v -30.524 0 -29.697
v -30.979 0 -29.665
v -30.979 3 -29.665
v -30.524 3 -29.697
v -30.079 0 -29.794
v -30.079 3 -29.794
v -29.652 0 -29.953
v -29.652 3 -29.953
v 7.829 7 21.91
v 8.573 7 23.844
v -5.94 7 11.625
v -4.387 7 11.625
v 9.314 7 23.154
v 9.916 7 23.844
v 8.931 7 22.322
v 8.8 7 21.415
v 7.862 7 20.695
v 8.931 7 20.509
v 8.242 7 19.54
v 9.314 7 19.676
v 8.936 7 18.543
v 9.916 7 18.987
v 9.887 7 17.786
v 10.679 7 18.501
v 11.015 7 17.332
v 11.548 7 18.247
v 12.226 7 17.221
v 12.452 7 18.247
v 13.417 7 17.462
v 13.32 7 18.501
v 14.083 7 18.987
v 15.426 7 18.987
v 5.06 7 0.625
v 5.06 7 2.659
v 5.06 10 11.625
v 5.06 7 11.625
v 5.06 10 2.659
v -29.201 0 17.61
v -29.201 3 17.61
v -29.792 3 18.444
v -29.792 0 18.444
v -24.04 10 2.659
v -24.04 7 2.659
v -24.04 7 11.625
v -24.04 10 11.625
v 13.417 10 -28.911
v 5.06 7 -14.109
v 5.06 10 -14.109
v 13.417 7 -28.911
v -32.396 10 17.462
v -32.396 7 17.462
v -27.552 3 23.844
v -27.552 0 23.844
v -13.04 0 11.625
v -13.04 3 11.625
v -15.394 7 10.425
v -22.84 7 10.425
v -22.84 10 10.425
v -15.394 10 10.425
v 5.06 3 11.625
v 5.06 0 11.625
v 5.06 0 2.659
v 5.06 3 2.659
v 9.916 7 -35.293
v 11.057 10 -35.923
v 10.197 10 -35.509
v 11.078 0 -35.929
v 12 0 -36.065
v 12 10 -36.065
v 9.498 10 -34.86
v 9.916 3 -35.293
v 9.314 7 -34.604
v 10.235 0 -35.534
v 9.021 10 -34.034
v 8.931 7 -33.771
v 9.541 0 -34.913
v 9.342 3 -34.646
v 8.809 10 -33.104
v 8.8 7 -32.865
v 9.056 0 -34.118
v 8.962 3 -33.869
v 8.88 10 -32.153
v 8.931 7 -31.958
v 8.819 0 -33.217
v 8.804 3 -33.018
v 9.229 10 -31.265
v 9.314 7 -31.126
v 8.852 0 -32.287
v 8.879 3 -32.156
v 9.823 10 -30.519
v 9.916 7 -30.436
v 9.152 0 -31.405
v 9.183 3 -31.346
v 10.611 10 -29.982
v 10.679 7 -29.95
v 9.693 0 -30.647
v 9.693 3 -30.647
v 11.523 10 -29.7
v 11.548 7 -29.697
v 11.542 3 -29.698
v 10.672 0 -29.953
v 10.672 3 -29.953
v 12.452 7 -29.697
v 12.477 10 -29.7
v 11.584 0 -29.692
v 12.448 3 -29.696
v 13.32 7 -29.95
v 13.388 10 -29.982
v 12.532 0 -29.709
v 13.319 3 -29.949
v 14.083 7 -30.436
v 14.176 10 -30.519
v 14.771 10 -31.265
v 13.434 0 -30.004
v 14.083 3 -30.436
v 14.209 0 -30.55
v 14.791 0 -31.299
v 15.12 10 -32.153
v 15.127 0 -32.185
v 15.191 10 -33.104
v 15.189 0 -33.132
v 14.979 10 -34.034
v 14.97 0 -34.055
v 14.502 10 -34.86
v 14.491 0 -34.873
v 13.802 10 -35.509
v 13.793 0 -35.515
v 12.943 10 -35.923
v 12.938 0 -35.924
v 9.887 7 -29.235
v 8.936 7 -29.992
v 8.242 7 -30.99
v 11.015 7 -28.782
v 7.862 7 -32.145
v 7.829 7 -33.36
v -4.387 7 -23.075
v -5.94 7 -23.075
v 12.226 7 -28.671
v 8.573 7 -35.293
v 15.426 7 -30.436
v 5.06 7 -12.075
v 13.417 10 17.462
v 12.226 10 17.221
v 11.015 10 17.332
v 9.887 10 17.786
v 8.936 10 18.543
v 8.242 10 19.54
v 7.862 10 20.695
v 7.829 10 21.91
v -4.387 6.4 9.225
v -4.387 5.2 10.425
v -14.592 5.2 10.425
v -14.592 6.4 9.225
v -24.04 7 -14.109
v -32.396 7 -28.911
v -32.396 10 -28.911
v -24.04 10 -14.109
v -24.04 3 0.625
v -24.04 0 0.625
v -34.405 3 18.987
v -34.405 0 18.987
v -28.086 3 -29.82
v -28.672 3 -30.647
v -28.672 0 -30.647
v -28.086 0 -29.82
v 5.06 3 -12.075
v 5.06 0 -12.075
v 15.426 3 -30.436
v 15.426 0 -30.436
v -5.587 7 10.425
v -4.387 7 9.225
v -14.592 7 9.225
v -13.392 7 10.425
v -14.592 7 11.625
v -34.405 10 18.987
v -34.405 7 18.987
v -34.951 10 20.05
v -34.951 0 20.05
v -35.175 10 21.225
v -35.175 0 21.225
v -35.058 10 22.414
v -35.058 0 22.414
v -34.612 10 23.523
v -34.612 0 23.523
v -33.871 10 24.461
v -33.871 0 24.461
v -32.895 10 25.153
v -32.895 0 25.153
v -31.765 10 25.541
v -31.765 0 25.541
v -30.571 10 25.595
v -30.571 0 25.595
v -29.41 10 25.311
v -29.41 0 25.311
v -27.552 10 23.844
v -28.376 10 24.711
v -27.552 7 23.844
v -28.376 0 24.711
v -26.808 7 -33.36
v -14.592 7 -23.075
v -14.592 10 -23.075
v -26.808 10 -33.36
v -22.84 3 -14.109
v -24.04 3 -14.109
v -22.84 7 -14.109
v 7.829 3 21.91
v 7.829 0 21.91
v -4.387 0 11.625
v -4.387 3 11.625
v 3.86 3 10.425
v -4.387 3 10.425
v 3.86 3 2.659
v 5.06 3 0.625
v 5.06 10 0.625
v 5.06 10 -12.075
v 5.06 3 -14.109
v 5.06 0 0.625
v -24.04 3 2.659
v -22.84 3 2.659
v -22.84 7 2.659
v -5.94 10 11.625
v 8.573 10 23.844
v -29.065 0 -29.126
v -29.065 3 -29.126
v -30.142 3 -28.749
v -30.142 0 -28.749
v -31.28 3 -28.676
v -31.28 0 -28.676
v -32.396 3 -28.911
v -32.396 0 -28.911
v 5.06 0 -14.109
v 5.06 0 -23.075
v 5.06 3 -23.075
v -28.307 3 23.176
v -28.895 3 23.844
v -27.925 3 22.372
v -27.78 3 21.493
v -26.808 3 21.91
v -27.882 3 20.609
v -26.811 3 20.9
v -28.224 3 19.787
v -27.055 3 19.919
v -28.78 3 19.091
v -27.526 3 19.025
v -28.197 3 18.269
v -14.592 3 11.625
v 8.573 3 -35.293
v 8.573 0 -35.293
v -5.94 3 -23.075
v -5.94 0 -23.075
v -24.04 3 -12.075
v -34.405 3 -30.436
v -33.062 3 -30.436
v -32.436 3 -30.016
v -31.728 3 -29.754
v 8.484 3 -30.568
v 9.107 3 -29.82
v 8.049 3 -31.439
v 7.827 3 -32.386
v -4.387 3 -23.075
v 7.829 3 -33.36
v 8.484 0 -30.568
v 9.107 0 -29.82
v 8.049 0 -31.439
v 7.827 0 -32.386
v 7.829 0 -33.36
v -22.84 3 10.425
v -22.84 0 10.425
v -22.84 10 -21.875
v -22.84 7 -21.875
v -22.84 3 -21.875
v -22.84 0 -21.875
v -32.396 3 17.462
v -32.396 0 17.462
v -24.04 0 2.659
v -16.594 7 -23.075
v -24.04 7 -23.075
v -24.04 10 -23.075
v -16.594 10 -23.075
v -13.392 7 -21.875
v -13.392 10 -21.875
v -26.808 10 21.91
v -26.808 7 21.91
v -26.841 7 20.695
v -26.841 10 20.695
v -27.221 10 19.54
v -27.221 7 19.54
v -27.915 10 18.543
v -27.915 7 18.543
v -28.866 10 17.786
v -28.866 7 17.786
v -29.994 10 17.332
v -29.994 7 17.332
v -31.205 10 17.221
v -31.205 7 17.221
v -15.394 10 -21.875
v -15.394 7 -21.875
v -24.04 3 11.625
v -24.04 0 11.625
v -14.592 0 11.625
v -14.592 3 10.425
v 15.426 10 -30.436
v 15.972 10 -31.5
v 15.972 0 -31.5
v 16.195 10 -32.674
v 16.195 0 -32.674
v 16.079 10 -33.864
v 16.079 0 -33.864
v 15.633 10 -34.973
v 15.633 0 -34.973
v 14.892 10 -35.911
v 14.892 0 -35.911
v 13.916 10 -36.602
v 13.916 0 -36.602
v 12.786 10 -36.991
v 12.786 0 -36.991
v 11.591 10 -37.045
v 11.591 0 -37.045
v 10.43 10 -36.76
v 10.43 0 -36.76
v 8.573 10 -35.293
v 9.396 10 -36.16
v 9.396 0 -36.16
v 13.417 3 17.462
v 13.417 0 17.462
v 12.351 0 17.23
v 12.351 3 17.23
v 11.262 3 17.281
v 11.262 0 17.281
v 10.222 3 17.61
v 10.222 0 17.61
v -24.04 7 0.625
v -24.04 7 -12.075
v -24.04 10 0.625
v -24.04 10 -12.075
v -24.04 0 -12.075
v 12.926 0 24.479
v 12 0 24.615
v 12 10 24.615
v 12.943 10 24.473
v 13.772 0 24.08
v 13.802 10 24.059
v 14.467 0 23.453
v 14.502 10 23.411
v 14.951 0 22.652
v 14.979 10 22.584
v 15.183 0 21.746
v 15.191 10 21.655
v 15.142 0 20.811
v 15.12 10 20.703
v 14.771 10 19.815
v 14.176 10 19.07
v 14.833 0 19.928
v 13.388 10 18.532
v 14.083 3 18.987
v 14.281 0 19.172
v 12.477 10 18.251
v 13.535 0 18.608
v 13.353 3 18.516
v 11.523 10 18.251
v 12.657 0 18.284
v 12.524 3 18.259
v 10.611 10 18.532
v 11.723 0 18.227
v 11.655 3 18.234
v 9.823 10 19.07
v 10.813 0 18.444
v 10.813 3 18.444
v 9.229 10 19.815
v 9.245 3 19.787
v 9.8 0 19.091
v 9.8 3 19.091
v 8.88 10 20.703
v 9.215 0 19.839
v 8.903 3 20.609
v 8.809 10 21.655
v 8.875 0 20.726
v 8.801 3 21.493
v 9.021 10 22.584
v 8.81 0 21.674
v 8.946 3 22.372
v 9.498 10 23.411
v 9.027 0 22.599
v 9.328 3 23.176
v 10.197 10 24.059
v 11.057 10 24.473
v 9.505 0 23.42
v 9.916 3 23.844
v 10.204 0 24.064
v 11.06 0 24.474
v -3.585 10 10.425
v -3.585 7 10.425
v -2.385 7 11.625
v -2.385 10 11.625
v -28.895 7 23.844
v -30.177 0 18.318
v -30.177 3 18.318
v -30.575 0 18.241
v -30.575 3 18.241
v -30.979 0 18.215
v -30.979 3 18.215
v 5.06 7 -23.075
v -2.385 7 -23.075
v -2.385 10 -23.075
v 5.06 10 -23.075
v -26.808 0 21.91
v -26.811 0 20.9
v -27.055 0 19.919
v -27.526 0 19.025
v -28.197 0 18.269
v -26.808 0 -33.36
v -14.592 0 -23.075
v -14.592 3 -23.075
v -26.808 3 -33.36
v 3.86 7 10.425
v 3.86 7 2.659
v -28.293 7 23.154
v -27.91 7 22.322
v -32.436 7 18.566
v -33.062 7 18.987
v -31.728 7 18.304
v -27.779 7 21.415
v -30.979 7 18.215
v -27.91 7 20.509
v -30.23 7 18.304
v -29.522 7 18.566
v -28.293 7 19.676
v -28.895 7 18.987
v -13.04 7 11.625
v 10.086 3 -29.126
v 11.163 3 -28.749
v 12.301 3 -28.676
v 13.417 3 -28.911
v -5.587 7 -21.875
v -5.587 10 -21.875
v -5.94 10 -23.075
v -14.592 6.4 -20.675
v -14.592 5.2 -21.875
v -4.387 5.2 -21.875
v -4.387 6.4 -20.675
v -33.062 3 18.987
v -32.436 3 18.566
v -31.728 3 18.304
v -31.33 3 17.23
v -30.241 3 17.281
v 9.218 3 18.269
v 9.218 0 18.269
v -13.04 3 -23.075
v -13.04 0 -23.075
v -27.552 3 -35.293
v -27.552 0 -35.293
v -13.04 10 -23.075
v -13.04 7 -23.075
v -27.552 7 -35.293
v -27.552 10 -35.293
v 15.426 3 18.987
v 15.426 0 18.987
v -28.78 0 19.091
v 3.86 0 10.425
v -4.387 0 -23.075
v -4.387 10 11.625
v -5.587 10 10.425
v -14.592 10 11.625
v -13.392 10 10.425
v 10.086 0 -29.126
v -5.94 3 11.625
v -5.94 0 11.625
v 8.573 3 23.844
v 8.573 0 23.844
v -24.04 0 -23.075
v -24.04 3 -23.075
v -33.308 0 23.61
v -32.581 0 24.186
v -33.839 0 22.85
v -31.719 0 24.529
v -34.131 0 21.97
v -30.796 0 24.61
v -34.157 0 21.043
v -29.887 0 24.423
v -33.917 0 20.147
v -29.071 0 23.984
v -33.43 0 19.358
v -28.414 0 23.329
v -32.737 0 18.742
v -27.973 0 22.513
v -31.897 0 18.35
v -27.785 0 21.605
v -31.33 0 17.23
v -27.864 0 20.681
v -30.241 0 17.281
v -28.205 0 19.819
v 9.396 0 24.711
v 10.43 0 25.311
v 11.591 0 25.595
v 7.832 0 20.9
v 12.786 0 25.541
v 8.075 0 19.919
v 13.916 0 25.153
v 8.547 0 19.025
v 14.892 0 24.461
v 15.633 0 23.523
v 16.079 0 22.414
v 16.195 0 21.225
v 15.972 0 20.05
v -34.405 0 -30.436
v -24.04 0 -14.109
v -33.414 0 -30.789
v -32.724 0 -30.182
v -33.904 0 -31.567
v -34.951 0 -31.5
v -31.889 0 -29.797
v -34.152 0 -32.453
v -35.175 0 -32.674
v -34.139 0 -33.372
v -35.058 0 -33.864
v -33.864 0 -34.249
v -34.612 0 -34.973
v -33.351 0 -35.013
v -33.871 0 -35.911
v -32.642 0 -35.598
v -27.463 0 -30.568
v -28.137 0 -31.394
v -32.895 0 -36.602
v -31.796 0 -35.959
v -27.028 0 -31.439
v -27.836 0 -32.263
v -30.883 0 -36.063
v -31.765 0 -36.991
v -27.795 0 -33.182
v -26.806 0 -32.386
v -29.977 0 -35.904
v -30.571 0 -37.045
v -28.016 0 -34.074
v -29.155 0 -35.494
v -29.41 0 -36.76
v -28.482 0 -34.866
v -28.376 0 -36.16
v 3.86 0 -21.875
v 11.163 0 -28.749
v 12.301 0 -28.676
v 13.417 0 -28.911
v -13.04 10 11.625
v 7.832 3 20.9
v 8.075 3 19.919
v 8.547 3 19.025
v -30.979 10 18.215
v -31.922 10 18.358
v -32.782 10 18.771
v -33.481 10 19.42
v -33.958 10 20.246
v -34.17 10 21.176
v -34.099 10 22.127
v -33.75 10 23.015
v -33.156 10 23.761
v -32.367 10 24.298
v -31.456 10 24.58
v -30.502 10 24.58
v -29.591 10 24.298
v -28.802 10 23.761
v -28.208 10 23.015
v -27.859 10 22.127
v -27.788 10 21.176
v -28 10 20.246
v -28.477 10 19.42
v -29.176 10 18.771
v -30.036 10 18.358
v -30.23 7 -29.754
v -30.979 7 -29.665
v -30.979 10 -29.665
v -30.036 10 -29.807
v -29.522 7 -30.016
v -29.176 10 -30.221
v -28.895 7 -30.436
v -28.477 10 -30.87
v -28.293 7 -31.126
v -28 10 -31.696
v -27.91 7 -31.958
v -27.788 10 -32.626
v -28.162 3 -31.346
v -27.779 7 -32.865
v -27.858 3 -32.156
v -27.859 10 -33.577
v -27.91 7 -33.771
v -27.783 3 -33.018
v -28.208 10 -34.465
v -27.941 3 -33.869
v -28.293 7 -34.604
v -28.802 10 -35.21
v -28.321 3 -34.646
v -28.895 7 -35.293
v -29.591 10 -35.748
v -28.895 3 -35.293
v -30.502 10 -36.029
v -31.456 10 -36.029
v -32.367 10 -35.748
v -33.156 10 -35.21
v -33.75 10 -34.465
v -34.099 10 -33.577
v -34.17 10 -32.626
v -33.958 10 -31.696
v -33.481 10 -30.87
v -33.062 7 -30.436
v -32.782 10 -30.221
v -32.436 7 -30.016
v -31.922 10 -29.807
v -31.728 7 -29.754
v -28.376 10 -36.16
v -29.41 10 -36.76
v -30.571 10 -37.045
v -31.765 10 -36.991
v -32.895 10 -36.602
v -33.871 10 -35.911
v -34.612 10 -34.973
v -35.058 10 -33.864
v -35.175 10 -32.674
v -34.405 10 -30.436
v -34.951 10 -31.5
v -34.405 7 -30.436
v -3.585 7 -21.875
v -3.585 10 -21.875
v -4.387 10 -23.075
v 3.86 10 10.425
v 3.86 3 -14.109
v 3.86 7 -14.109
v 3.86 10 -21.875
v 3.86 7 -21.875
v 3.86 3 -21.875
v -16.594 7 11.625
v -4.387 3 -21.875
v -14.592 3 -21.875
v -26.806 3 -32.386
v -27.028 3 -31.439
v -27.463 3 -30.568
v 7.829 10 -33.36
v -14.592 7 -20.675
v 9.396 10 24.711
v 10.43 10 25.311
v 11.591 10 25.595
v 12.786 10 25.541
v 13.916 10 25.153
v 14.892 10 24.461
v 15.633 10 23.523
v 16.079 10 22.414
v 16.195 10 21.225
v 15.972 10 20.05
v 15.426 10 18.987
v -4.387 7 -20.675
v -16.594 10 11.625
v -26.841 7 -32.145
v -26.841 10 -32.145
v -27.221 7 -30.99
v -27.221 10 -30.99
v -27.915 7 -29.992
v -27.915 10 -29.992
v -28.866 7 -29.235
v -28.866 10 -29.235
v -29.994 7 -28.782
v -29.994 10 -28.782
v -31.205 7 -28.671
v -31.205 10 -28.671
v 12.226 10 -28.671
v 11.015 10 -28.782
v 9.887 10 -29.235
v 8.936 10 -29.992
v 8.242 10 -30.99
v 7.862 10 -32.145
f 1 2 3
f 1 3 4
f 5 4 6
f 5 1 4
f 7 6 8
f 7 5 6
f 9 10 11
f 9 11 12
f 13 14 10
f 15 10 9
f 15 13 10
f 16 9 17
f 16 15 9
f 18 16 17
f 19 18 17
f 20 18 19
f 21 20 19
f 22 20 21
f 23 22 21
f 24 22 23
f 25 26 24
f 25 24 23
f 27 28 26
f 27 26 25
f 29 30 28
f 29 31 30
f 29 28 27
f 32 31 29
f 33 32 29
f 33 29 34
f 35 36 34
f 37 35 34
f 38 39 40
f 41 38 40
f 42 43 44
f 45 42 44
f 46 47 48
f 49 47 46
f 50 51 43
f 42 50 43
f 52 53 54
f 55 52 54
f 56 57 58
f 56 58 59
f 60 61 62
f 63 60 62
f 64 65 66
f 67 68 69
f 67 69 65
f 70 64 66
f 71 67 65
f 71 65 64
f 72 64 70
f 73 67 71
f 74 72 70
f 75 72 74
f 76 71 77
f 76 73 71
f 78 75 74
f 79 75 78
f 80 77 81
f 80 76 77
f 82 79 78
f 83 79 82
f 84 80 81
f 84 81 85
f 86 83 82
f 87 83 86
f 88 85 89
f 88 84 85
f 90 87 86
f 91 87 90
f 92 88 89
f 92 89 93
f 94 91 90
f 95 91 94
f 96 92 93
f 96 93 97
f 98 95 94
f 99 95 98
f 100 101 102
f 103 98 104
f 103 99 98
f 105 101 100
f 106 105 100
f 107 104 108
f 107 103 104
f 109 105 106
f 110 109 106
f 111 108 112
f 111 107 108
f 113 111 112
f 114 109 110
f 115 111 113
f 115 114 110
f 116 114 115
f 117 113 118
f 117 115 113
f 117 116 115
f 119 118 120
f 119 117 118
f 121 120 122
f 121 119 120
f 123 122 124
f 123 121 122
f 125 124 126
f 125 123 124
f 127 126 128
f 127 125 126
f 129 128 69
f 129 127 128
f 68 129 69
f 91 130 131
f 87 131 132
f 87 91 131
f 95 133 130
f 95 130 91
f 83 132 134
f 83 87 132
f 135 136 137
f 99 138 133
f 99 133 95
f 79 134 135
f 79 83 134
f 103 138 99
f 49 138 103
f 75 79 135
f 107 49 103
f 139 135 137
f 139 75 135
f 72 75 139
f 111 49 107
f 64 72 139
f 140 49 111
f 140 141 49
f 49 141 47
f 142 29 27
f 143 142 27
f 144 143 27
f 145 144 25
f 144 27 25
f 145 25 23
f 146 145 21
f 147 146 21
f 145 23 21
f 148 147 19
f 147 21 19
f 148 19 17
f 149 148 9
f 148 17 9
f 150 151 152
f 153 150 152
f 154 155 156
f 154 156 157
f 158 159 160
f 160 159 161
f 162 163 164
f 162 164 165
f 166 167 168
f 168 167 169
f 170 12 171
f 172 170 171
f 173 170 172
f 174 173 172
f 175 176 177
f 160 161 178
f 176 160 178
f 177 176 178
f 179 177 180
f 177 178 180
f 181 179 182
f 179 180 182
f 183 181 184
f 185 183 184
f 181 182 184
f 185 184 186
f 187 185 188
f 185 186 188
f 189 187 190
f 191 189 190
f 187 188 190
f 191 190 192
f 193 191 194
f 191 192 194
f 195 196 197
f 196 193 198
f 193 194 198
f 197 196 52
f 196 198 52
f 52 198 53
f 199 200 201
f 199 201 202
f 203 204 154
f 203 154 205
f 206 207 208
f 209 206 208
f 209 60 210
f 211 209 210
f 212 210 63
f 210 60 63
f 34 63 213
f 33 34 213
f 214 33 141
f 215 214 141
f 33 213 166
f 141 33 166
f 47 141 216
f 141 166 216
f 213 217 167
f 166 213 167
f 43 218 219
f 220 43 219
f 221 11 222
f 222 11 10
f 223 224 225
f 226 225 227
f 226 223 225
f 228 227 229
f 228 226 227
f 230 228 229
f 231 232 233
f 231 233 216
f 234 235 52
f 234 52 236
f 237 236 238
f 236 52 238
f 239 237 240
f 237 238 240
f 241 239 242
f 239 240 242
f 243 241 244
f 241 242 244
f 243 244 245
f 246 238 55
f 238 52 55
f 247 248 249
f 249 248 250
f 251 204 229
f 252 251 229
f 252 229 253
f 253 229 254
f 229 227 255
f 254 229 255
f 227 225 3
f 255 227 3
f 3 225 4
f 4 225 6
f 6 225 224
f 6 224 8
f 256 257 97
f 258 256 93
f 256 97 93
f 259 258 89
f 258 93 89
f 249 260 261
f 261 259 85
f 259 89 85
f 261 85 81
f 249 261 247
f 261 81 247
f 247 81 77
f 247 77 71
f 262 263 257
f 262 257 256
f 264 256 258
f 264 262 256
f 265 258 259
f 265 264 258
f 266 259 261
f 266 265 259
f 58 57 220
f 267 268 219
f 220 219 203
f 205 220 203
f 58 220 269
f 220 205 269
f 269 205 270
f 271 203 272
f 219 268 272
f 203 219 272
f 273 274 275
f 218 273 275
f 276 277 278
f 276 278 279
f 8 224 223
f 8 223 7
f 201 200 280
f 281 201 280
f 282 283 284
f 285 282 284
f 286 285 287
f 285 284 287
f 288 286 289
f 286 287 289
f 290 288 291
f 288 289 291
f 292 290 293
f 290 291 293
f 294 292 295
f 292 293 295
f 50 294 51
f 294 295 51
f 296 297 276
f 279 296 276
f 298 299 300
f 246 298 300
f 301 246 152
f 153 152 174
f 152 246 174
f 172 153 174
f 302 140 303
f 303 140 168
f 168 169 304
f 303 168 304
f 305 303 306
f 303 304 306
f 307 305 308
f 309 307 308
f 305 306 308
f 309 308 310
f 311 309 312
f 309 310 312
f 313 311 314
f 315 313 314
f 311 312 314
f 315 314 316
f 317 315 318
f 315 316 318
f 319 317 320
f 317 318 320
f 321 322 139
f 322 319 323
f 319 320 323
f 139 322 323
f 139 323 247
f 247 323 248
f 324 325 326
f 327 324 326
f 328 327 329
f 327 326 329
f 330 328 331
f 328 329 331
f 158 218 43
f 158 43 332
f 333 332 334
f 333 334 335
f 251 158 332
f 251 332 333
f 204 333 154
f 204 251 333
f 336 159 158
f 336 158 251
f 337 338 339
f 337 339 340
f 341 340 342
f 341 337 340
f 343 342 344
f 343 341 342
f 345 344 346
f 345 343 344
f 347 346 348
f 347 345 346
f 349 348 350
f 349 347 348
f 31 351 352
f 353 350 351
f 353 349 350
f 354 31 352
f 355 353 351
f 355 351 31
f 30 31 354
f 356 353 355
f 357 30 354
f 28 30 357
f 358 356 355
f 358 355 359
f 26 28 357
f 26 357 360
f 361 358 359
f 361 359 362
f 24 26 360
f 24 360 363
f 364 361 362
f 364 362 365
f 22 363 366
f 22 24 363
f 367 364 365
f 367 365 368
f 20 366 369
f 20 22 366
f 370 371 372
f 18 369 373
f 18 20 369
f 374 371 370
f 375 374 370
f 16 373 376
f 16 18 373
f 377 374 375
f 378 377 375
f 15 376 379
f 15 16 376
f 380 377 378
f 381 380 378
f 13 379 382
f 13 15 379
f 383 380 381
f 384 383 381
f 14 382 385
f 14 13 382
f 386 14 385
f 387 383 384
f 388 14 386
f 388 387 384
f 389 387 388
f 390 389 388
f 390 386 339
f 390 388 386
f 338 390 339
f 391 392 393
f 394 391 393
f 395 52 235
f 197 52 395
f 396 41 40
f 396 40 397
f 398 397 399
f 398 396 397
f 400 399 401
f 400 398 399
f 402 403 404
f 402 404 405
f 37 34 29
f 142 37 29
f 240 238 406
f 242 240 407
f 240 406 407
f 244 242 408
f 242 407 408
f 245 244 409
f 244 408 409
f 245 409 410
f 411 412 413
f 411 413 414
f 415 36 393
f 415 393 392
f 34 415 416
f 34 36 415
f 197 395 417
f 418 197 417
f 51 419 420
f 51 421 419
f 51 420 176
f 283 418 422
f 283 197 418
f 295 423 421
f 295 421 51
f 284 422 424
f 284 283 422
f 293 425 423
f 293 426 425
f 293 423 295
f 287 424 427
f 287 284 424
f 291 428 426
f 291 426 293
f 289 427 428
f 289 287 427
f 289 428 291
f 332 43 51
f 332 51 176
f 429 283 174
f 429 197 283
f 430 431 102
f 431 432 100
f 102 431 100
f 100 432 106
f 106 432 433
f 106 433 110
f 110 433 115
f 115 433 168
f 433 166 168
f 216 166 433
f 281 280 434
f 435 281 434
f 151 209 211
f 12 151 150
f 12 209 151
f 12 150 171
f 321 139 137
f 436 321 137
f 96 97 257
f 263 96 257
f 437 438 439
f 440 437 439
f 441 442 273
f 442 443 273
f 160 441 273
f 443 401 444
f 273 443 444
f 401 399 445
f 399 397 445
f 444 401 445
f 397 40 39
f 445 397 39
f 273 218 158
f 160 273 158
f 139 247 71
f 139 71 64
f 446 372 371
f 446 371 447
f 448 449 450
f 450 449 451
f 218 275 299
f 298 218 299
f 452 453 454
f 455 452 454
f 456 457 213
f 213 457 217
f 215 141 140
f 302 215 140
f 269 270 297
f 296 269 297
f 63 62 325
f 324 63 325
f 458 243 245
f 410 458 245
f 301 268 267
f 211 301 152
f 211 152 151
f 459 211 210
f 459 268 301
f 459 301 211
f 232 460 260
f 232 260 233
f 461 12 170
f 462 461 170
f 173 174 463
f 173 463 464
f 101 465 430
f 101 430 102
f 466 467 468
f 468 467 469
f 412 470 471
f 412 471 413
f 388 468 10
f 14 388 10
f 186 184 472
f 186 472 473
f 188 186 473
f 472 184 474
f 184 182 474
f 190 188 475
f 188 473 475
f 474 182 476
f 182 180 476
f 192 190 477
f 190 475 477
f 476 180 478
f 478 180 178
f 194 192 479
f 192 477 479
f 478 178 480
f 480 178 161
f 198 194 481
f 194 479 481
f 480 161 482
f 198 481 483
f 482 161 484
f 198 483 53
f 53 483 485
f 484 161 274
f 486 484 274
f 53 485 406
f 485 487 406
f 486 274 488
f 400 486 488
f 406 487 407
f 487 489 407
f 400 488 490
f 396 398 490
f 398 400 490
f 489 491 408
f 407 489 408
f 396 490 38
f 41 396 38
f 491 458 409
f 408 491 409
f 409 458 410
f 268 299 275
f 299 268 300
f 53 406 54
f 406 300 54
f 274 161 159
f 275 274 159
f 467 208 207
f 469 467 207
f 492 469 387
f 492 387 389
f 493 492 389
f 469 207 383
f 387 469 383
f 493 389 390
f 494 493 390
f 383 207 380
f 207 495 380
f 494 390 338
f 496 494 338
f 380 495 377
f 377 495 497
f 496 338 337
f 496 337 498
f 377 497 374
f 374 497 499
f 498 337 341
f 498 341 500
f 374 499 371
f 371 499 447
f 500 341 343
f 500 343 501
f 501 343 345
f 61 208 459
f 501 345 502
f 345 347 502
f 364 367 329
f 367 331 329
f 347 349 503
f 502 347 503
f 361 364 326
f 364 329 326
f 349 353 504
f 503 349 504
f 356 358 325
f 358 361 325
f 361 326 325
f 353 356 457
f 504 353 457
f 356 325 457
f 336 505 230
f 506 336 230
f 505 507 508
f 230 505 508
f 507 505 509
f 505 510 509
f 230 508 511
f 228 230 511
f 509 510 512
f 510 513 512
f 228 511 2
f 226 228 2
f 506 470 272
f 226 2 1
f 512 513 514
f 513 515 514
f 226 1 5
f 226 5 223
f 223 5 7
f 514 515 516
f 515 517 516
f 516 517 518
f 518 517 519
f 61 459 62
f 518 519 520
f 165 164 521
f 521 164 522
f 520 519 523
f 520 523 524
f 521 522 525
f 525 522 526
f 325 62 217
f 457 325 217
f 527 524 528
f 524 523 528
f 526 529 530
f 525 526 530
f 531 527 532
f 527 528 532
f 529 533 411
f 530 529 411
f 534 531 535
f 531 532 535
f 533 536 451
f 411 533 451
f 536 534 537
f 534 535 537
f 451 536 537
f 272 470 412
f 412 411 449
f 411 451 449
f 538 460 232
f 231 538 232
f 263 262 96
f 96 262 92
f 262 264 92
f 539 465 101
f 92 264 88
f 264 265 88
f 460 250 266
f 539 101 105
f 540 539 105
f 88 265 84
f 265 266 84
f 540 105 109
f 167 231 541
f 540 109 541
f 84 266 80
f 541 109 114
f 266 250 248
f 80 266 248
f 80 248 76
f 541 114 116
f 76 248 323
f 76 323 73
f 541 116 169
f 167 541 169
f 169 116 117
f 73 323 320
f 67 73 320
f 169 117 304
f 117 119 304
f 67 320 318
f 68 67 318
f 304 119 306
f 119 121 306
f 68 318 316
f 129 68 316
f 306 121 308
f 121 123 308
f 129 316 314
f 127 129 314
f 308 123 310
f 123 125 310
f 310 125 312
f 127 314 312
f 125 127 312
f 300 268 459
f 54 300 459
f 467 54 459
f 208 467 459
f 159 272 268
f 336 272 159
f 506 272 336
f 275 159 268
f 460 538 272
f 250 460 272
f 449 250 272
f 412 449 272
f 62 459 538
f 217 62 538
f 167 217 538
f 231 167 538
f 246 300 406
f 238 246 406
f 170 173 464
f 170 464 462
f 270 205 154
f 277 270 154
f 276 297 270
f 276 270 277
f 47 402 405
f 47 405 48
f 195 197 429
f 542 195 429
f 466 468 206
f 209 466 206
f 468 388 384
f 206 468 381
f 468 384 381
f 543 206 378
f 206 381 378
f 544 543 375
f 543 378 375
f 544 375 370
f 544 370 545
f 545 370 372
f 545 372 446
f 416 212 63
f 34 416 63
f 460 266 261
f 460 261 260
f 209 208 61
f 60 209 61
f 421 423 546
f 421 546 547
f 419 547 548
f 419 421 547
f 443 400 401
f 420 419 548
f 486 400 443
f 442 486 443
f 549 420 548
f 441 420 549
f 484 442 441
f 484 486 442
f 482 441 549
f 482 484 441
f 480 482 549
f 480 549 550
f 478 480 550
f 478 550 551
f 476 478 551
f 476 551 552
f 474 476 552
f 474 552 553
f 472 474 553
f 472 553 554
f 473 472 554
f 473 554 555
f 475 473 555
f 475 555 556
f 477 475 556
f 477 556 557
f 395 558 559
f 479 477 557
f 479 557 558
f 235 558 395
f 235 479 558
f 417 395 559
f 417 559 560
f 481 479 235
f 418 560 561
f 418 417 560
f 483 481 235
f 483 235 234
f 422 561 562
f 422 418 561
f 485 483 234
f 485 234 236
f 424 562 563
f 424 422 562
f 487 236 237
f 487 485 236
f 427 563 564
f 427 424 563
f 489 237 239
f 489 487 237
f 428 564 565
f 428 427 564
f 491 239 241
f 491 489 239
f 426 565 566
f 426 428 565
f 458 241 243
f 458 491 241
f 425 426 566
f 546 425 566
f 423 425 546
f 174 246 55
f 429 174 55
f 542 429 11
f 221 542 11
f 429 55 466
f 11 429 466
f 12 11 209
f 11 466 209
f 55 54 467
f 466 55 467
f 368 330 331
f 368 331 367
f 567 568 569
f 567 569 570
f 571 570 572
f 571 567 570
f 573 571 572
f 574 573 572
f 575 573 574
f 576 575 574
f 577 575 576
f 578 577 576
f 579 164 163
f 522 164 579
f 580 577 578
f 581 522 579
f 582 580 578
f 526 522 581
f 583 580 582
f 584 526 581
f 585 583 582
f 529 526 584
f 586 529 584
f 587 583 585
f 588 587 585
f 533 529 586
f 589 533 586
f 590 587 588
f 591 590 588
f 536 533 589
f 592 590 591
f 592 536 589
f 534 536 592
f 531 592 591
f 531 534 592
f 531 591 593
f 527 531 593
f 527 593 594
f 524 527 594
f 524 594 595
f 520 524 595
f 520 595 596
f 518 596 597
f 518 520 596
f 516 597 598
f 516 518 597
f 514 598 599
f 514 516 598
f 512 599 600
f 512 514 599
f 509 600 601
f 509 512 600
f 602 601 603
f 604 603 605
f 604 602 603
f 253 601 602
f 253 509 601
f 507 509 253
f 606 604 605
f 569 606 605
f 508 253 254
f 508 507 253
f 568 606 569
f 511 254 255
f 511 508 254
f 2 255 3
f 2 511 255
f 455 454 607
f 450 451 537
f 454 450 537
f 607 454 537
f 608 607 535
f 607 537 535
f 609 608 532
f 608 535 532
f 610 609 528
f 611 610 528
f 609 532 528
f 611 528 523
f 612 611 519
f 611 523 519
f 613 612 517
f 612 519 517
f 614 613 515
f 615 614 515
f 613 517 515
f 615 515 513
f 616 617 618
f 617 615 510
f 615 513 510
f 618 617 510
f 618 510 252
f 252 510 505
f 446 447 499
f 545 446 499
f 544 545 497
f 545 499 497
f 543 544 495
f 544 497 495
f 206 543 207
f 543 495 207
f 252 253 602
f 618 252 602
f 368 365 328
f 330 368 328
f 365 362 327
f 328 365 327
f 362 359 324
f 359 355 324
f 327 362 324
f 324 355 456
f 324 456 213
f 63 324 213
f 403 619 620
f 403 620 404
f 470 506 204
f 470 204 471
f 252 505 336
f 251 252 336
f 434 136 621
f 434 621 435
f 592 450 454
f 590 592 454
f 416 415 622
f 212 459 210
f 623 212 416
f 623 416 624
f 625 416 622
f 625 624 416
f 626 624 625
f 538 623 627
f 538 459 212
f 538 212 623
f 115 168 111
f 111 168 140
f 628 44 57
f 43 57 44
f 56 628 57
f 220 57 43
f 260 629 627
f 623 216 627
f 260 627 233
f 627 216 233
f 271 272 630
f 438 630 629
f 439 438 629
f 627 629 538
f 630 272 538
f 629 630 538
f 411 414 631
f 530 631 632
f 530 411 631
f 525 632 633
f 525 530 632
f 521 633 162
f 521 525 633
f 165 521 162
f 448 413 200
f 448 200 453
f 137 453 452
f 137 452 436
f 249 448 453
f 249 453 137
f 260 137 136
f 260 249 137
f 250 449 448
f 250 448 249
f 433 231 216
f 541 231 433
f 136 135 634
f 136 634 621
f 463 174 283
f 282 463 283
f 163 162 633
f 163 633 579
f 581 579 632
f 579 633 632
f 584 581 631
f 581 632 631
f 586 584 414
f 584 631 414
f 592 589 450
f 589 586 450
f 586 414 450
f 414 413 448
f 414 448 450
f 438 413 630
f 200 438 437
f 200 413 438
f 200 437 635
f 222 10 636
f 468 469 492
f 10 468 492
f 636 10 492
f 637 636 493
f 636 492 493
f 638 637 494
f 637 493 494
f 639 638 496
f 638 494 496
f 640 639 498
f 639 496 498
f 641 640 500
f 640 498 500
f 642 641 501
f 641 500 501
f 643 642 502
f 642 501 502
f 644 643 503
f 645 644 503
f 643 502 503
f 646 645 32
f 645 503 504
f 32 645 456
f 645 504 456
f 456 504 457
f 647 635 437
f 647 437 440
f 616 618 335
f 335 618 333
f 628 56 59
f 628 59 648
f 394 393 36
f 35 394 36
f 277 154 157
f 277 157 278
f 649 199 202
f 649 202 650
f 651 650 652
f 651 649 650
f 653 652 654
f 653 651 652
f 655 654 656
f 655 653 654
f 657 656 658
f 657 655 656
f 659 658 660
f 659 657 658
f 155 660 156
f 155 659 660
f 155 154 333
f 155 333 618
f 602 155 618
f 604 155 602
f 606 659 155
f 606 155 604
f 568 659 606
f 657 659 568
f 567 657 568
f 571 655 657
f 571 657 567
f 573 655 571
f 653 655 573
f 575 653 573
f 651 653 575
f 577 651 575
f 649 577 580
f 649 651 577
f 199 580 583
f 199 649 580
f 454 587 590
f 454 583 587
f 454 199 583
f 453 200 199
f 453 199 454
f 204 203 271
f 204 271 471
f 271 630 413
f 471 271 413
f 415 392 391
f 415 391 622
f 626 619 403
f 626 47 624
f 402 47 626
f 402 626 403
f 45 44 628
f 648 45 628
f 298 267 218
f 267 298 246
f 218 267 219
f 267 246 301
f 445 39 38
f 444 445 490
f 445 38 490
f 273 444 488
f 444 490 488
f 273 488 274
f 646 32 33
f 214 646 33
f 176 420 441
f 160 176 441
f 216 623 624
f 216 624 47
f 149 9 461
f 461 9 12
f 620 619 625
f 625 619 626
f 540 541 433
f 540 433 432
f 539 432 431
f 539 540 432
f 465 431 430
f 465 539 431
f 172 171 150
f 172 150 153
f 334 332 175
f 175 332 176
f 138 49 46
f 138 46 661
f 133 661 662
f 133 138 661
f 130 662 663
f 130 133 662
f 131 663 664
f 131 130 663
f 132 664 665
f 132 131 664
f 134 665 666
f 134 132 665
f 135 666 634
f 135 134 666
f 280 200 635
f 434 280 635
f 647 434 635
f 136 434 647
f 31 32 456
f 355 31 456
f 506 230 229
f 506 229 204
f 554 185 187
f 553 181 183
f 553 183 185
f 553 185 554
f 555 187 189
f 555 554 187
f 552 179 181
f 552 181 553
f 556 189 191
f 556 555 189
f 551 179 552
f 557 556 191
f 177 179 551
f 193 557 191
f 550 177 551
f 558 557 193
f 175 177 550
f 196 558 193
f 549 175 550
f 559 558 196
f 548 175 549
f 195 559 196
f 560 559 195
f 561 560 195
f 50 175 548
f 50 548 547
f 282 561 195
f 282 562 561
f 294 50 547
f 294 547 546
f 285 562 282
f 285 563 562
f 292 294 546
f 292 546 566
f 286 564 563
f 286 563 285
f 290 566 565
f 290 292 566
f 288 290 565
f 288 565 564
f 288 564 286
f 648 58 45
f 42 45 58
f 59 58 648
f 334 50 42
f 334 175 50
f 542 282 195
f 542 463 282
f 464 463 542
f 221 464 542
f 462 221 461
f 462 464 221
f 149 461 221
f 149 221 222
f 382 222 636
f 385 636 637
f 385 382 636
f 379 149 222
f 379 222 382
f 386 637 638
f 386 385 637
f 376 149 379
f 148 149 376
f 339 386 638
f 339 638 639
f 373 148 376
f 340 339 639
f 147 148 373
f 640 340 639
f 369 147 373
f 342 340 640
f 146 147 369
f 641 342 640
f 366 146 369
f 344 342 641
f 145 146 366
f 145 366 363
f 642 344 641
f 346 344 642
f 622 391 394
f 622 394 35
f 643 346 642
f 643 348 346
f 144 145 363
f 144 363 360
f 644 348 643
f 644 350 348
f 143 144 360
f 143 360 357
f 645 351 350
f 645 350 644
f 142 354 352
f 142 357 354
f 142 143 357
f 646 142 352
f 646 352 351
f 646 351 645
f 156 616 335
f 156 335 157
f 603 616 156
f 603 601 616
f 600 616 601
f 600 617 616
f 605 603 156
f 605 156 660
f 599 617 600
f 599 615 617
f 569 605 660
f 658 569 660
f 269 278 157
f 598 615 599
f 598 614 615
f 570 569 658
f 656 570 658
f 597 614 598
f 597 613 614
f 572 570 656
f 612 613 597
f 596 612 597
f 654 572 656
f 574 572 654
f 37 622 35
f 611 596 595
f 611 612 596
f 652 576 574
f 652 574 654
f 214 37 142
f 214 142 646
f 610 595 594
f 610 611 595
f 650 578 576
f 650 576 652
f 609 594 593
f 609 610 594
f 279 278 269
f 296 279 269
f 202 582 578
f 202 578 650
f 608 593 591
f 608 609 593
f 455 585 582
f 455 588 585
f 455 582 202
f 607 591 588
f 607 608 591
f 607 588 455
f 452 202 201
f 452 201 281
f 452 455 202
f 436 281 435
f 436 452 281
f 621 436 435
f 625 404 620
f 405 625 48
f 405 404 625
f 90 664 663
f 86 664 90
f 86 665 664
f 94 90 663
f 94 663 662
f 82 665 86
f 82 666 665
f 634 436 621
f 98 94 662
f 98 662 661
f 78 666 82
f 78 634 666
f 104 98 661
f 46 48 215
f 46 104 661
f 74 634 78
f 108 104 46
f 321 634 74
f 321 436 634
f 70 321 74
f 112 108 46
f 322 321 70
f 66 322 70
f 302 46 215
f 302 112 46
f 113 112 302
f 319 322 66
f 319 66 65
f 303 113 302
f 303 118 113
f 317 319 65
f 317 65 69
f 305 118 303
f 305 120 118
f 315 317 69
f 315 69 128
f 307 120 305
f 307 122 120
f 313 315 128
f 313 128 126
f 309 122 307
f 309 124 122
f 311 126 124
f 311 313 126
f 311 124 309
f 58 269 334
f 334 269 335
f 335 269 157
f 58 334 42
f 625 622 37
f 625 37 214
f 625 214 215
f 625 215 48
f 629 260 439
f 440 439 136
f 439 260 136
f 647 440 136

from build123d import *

# Parameters (mm, degrees)
SKETCH1_R               = 3.2
SKETCH1_W               = 26.7
SKETCH1_H               = 32.3
BOSS_EXTRUDE2_DEPTH     = 10
CUT_EXTRUDE1_DEPTH      = 68.219866013
SKETCH3_W               = 36.125771517
SKETCH3_H               = 4
CUT_EXTRUDE2_DEPTH      = 77.38869507
CUT_EXTRUDE3_REACH      = 60.207
CUT_EXTRUDE3_END_RADIUS = 3.2
SKETCH4_W               = 4.857578305
SKETCH4_H               = 4
CUT_EXTRUDE4_REACH      = 60.207
CUT_EXTRUDE4_END_RADIUS = 3.2
SKETCH5_W               = 4.857578305
SKETCH5_H               = 4
CUT_EXTRUDE5_REACH      = 60.207
CUT_EXTRUDE5_END_RADIUS = 3.2
SKETCH6_W               = 4.857578305
SKETCH6_H               = 4
CUT_EXTRUDE6_REACH      = 60.207
CUT_EXTRUDE6_END_RADIUS = 3.2
SKETCH7_W               = 4.857578305
SKETCH7_H               = 4
SKETCH8_W               = 10.205315409
SKETCH8_H               = 1.2
SKETCH8_W_2             = 1.2
SKETCH8_H_2             = 16.7681893
BOSS_EXTRUDE3_DEPTH     = 4
CUT_EXTRUDE7_DEPTH      = 52.578594453
SKETCH10_W              = 10.205315409
SKETCH10_H              = 0.6
BOSS_EXTRUDE4_DEPTH     = 1.2
CHAMFER1_SIZE           = 1.2
SKETCH12_W              = 10.205315409
SKETCH12_H              = 0.6
BOSS_EXTRUDE5_DEPTH     = 1.2
CHAMFER2_SIZE           = 1.2
CUT_EXTRUDE8_DEPTH      = 53.070638614
CUT_EXTRUDE8_DEPTH_BACK = 3


with BuildPart() as part:
    # Sketch1 → Boss-Extrude2 (new body)
    with BuildSketch(Plane(origin=(0, 0, 0), x_dir=(1, 0, 0), z_dir=(0, 1, 0))):
        with BuildLine():
            Line((-34.405486348, 30.435899661), (-24.03957695, 12.074655042))
            Line((-24.03957695, 12.074655042), (-24.03957695, -0.625344958))
            Line((-24.03957695, -0.625344958), (-34.405486348, -18.986589577))
            ThreePointArc((-34.405486348, -18.986589577), (-33.407763681, -24.841890549), (-27.552462708, -23.844167882))
            Line((-27.552462708, -23.844167882), (-13.03957695, -11.625344958))
            Line((-13.03957695, -11.625344958), (-5.93957695, -11.625344958))
            Line((-5.93957695, -11.625344958), (8.573308809, -23.844167882))
            ThreePointArc((8.573308809, -23.844167882), (14.428609781, -24.841890549), (15.426332449, -18.986589577))
            Line((15.426332449, -18.986589577), (5.06042305, -0.625344958))
            Line((5.06042305, -0.625344958), (5.06042305, 12.074655042))
            Line((5.06042305, 12.074655042), (15.426332449, 30.435899661))
            ThreePointArc((15.426332449, 30.435899661), (14.428609781, 36.291200634), (8.573308809, 35.293477966))
            Line((8.573308809, 35.293477966), (-5.93957695, 23.074655042))
            Line((-5.93957695, 23.074655042), (-13.03957695, 23.074655042))
            Line((-13.03957695, 23.074655042), (-27.552462708, 35.293477966))
            ThreePointArc((-27.552462708, 35.293477966), (-33.407763681, 36.291200634), (-34.405486348, 30.435899661))
        make_face()
        with Locations(Location((-30.978974528, 32.864688814, 0), (0, 0, 270))):
            Circle(SKETCH1_R, mode=Mode.SUBTRACT)
        with Locations(Location((11.999820629, 32.864688814, 0), (0, 0, 90))):
            Circle(SKETCH1_R, mode=Mode.SUBTRACT)
        with Locations(Location((-30.978974528, -21.415378729, 0), (0, 0, 90))):
            Circle(SKETCH1_R, mode=Mode.SUBTRACT)
        with Locations(Location((11.999820629, -21.415378729, 0), (0, 0, 270))):
            Circle(SKETCH1_R, mode=Mode.SUBTRACT)
        with BuildLine():
            Line((-24.03957695, 23.074655042), (-14.592234654, 23.074655042))
            Line((-14.592234654, 23.074655042), (-26.808244007, 33.359670553))
            ThreePointArc((-26.808244007, 33.359670553), (-28.363078678, 29.578796408), (-32.396270044, 28.911048286))
            Line((-32.396270044, 28.911048286), (-24.03957695, 14.108749692))
            Line((-24.03957695, 14.108749692), (-24.03957695, 23.074655042))
        make_face(mode=Mode.SUBTRACT)
        with Locations((-9.48957695, 5.724655042)):
            Rectangle(SKETCH1_W, SKETCH1_H, mode=Mode.SUBTRACT)
        with BuildLine():
            Line((5.06042305, 23.074655042), (5.06042305, 14.108749692))
            Line((5.06042305, 14.108749692), (13.417116145, 28.911048286))
            ThreePointArc((13.417116145, 28.911048286), (9.383924779, 29.578796408), (7.829090108, 33.359670553))
            Line((7.829090108, 33.359670553), (-4.386919245, 23.074655042))
            Line((-4.386919245, 23.074655042), (5.06042305, 23.074655042))
        make_face(mode=Mode.SUBTRACT)
        with BuildLine():
            Line((-24.03957695, -11.625344958), (-14.592234654, -11.625344958))
            Line((-14.592234654, -11.625344958), (-26.808244007, -21.910360468))
            ThreePointArc((-26.808244007, -21.910360468), (-28.363078678, -18.129486324), (-32.396270044, -17.461738202))
            Line((-32.396270044, -17.461738202), (-24.03957695, -2.659439608))
            Line((-24.03957695, -2.659439608), (-24.03957695, -11.625344958))
        make_face(mode=Mode.SUBTRACT)
        with BuildLine():
            Line((7.829090108, -21.910360468), (-4.386919245, -11.625344958))
            Line((-4.386919245, -11.625344958), (5.06042305, -11.625344958))
            Line((5.06042305, -11.625344958), (5.06042305, -2.659439608))
            Line((5.06042305, -2.659439608), (13.417116145, -17.461738202))
            ThreePointArc((13.417116145, -17.461738202), (9.383924779, -18.129486324), (7.829090108, -21.910360468))
        make_face(mode=Mode.SUBTRACT)
    extrude(amount=BOSS_EXTRUDE2_DEPTH)

    # Sketch2 → Cut-Extrude1 (cut, through all)
    with BuildSketch(Plane(origin=(20, 0, 0), x_dir=(0, 0, -1), z_dir=(1, 0, 0))):
        Polygon((-18.986589577, 5), (-18.986589577, 7), (-0.625344958, 7), (-0.625344958, 5), (-0.625344958, 3), (-18.986589577, 3), align=None)
        Polygon((30.435899661, 7), (12.074655042, 7), (12.074655042, 5), (12.074655042, 3), (30.435899661, 3), (30.435899661, 5), align=None)
    extrude(amount=-CUT_EXTRUDE1_DEPTH, mode=Mode.SUBTRACT)

    # Sketch3 → Cut-Extrude2 (cut, through all)
    with BuildSketch(Plane.XY.offset(30)):
        with Locations((-9.489576949, 5)):
            Rectangle(SKETCH3_W, SKETCH3_H)
    extrude(amount=-CUT_EXTRUDE2_DEPTH, mode=Mode.SUBTRACT)

    # Cut-Extrude3: up to this cylinder (the profile starts outside it)
    cut_extrude3_end = Plane(origin=(-30.978974528, 5, 21.415378729), z_dir=(0, -1, 0)) * Cylinder(CUT_EXTRUDE3_END_RADIUS, 127.814, mode=Mode.PRIVATE)
    # Sketch4 → Cut-Extrude3 (cut, up to the surface)
    with BuildSketch(Plane(origin=(-27.552462708, 0, 0), x_dir=(0, 0, -1), z_dir=(1, 0, 0)), mode=Mode.PRIVATE) as cut_extrude3_sk1:
        with Locations((-21.415378729, 5)):
            Rectangle(SKETCH4_W, SKETCH4_H)
    cut_extrude3_tool1 = extrude(cut_extrude3_sk1.sketch, amount=-CUT_EXTRUDE3_REACH, mode=Mode.PRIVATE) - cut_extrude3_end
    add(cut_extrude3_tool1.solids().sort_by_distance((-27.552463, 5, 21.415379))[0], mode=Mode.SUBTRACT)

    # Cut-Extrude4: up to this cylinder (the profile starts outside it)
    cut_extrude4_end = Plane(origin=(11.999820629, 5, 21.415378729), z_dir=(0, -1, 0)) * Cylinder(CUT_EXTRUDE4_END_RADIUS, 127.814, mode=Mode.PRIVATE)
    # Sketch5 → Cut-Extrude4 (cut, up to the surface)
    with BuildSketch(Plane.ZY.offset(-8.573308809), mode=Mode.PRIVATE) as cut_extrude4_sk1:
        with Locations((21.415378729, 5)):
            Rectangle(SKETCH5_W, SKETCH5_H)
    cut_extrude4_tool1 = extrude(cut_extrude4_sk1.sketch, amount=-CUT_EXTRUDE4_REACH, mode=Mode.PRIVATE) - cut_extrude4_end
    add(cut_extrude4_tool1.solids().sort_by_distance((8.573309, 5, 21.415379))[0], mode=Mode.SUBTRACT)

    # Cut-Extrude5: up to this cylinder (the profile starts outside it)
    cut_extrude5_end = Plane(origin=(-30.978974528, 5, -32.864688814), z_dir=(0, -1, 0)) * Cylinder(CUT_EXTRUDE5_END_RADIUS, 127.814, mode=Mode.PRIVATE)
    # Sketch6 → Cut-Extrude5 (cut, up to the surface)
    with BuildSketch(Plane(origin=(-27.552462708, 0, 0), x_dir=(0, 0, -1), z_dir=(1, 0, 0)), mode=Mode.PRIVATE) as cut_extrude5_sk1:
        with Locations((32.864688814, 5)):
            Rectangle(SKETCH6_W, SKETCH6_H)
    cut_extrude5_tool1 = extrude(cut_extrude5_sk1.sketch, amount=-CUT_EXTRUDE5_REACH, mode=Mode.PRIVATE) - cut_extrude5_end
    add(cut_extrude5_tool1.solids().sort_by_distance((-27.552463, 5, -32.864689))[0], mode=Mode.SUBTRACT)

    # Cut-Extrude6: up to this cylinder (the profile starts outside it)
    cut_extrude6_end = Plane(origin=(11.999820629, 5, -32.864688814), z_dir=(0, -1, 0)) * Cylinder(CUT_EXTRUDE6_END_RADIUS, 127.814, mode=Mode.PRIVATE)
    # Sketch7 → Cut-Extrude6 (cut, up to the surface)
    with BuildSketch(Plane.ZY.offset(-8.573308809), mode=Mode.PRIVATE) as cut_extrude6_sk1:
        with Locations((-32.864688814, 5)):
            Rectangle(SKETCH7_W, SKETCH7_H)
    cut_extrude6_tool1 = extrude(cut_extrude6_sk1.sketch, amount=-CUT_EXTRUDE6_REACH, mode=Mode.PRIVATE) - cut_extrude6_end
    add(cut_extrude6_tool1.solids().sort_by_distance((8.573309, 5, -32.864689))[0], mode=Mode.SUBTRACT)

    # Sketch8 → Boss-Extrude3 (add)
    with BuildSketch(Plane(origin=(0, 3, 0), x_dir=(1, 0, 0), z_dir=(0, 1, 0))):
        with Locations((-9.489576949, 22.474655042)):
            Rectangle(SKETCH8_W, SKETCH8_H)
        with Locations((-9.489576949, -11.025344958)):
            Rectangle(SKETCH8_W, SKETCH8_H)
        with Locations((-23.43957695, 5.724655042)):
            Rectangle(SKETCH8_W_2, SKETCH8_H_2)
        with Locations((4.46042305, 5.724655042)):
            Rectangle(SKETCH8_W_2, SKETCH8_H_2)
    extrude(amount=BOSS_EXTRUDE3_DEPTH)

    # Sketch9 → Cut-Extrude7 (cut, through all)
    with BuildSketch(Plane(origin=(0, 3, 0), x_dir=(1, 0, 0), z_dir=(0, 1, 0))):
        Polygon((-27.717427746, 29.299754586), (-28.696368176, 28.605726031), (-30.707626394, 31.442643867), (-29.728685964, 32.136672421), align=None)
        Polygon((11.728472495, 31.442643867), (10.749532065, 32.136672421), (8.738273847, 29.299754586), (9.717214277, 28.605726031), align=None)
        Polygon((9.717214277, -16.898697434), (11.728472495, -19.735615269), (10.749532065, -20.429643824), (8.738273847, -17.592725989), align=None)
        Polygon((-30.707626394, -19.735615269), (-29.728685964, -20.429643824), (-27.717427746, -17.592725989), (-28.696368176, -16.898697434), align=None)
    extrude(amount=-CUT_EXTRUDE7_DEPTH, mode=Mode.SUBTRACT)

    # Sketch10 → Boss-Extrude4 (add)
    with BuildSketch(Plane.XY.offset(-21.874655042)):
        with Locations((-9.489576949, 6.7)):
            Rectangle(SKETCH10_W, SKETCH10_H)
    extrude(amount=BOSS_EXTRUDE4_DEPTH)

    # Chamfer1
    chamfer1_edges = [part.edges().sort_by_distance(p)[0] for p in [
        (-9.48957695, 6.4, -21.874655042),
    ]]
    chamfer(chamfer1_edges, length=CHAMFER1_SIZE - 0.0001)  # a hair under: the kernel refuses the full size

    # Sketch12 → Boss-Extrude5 (add)
    with BuildSketch(Plane(origin=(0, 0, 10.425344958), x_dir=(-1, 0, 0), z_dir=(0, 0, -1))):
        with Locations((9.489576949, 6.7)):
            Rectangle(SKETCH12_W, SKETCH12_H)
    extrude(amount=BOSS_EXTRUDE5_DEPTH)

    # Chamfer2
    chamfer2_edges = [part.edges().sort_by_distance(p)[0] for p in [
        (-9.48957695, 6.4, 10.425344958),
    ]]
    chamfer(chamfer2_edges, length=CHAMFER2_SIZE - 0.0001)  # a hair under: the kernel refuses the full size

    # Sketch13 → Cut-Extrude8 (cut, two sides: drawn at the far end of the back side and taken through both)
    with BuildSketch(Plane(origin=(0, 10, 0), x_dir=(1, 0, 0), z_dir=(0, 1, 0)).offset(-CUT_EXTRUDE8_DEPTH_BACK)):
        Polygon((-14.592234654, 23.074655042), (-13.392234654, 21.874655042), (-15.393970224, 21.874655042), (-16.593970224, 23.074655042), align=None)
        Polygon((-3.585183676, 21.874655042), (-2.385183676, 23.074655042), (-4.386919245, 23.074655042), (-5.586919245, 21.874655042), align=None)
        Polygon((-5.586919245, -10.425344958), (-3.585183676, -10.425344958), (-2.385183676, -11.625344958), (-4.386919245, -11.625344958), align=None)
        Polygon((-15.393970224, -10.425344958), (-16.593970224, -11.625344958), (-14.592234654, -11.625344958), (-13.392234654, -10.425344958), align=None)
    extrude(amount=CUT_EXTRUDE8_DEPTH + CUT_EXTRUDE8_DEPTH_BACK, mode=Mode.SUBTRACT)


solid = part.part
